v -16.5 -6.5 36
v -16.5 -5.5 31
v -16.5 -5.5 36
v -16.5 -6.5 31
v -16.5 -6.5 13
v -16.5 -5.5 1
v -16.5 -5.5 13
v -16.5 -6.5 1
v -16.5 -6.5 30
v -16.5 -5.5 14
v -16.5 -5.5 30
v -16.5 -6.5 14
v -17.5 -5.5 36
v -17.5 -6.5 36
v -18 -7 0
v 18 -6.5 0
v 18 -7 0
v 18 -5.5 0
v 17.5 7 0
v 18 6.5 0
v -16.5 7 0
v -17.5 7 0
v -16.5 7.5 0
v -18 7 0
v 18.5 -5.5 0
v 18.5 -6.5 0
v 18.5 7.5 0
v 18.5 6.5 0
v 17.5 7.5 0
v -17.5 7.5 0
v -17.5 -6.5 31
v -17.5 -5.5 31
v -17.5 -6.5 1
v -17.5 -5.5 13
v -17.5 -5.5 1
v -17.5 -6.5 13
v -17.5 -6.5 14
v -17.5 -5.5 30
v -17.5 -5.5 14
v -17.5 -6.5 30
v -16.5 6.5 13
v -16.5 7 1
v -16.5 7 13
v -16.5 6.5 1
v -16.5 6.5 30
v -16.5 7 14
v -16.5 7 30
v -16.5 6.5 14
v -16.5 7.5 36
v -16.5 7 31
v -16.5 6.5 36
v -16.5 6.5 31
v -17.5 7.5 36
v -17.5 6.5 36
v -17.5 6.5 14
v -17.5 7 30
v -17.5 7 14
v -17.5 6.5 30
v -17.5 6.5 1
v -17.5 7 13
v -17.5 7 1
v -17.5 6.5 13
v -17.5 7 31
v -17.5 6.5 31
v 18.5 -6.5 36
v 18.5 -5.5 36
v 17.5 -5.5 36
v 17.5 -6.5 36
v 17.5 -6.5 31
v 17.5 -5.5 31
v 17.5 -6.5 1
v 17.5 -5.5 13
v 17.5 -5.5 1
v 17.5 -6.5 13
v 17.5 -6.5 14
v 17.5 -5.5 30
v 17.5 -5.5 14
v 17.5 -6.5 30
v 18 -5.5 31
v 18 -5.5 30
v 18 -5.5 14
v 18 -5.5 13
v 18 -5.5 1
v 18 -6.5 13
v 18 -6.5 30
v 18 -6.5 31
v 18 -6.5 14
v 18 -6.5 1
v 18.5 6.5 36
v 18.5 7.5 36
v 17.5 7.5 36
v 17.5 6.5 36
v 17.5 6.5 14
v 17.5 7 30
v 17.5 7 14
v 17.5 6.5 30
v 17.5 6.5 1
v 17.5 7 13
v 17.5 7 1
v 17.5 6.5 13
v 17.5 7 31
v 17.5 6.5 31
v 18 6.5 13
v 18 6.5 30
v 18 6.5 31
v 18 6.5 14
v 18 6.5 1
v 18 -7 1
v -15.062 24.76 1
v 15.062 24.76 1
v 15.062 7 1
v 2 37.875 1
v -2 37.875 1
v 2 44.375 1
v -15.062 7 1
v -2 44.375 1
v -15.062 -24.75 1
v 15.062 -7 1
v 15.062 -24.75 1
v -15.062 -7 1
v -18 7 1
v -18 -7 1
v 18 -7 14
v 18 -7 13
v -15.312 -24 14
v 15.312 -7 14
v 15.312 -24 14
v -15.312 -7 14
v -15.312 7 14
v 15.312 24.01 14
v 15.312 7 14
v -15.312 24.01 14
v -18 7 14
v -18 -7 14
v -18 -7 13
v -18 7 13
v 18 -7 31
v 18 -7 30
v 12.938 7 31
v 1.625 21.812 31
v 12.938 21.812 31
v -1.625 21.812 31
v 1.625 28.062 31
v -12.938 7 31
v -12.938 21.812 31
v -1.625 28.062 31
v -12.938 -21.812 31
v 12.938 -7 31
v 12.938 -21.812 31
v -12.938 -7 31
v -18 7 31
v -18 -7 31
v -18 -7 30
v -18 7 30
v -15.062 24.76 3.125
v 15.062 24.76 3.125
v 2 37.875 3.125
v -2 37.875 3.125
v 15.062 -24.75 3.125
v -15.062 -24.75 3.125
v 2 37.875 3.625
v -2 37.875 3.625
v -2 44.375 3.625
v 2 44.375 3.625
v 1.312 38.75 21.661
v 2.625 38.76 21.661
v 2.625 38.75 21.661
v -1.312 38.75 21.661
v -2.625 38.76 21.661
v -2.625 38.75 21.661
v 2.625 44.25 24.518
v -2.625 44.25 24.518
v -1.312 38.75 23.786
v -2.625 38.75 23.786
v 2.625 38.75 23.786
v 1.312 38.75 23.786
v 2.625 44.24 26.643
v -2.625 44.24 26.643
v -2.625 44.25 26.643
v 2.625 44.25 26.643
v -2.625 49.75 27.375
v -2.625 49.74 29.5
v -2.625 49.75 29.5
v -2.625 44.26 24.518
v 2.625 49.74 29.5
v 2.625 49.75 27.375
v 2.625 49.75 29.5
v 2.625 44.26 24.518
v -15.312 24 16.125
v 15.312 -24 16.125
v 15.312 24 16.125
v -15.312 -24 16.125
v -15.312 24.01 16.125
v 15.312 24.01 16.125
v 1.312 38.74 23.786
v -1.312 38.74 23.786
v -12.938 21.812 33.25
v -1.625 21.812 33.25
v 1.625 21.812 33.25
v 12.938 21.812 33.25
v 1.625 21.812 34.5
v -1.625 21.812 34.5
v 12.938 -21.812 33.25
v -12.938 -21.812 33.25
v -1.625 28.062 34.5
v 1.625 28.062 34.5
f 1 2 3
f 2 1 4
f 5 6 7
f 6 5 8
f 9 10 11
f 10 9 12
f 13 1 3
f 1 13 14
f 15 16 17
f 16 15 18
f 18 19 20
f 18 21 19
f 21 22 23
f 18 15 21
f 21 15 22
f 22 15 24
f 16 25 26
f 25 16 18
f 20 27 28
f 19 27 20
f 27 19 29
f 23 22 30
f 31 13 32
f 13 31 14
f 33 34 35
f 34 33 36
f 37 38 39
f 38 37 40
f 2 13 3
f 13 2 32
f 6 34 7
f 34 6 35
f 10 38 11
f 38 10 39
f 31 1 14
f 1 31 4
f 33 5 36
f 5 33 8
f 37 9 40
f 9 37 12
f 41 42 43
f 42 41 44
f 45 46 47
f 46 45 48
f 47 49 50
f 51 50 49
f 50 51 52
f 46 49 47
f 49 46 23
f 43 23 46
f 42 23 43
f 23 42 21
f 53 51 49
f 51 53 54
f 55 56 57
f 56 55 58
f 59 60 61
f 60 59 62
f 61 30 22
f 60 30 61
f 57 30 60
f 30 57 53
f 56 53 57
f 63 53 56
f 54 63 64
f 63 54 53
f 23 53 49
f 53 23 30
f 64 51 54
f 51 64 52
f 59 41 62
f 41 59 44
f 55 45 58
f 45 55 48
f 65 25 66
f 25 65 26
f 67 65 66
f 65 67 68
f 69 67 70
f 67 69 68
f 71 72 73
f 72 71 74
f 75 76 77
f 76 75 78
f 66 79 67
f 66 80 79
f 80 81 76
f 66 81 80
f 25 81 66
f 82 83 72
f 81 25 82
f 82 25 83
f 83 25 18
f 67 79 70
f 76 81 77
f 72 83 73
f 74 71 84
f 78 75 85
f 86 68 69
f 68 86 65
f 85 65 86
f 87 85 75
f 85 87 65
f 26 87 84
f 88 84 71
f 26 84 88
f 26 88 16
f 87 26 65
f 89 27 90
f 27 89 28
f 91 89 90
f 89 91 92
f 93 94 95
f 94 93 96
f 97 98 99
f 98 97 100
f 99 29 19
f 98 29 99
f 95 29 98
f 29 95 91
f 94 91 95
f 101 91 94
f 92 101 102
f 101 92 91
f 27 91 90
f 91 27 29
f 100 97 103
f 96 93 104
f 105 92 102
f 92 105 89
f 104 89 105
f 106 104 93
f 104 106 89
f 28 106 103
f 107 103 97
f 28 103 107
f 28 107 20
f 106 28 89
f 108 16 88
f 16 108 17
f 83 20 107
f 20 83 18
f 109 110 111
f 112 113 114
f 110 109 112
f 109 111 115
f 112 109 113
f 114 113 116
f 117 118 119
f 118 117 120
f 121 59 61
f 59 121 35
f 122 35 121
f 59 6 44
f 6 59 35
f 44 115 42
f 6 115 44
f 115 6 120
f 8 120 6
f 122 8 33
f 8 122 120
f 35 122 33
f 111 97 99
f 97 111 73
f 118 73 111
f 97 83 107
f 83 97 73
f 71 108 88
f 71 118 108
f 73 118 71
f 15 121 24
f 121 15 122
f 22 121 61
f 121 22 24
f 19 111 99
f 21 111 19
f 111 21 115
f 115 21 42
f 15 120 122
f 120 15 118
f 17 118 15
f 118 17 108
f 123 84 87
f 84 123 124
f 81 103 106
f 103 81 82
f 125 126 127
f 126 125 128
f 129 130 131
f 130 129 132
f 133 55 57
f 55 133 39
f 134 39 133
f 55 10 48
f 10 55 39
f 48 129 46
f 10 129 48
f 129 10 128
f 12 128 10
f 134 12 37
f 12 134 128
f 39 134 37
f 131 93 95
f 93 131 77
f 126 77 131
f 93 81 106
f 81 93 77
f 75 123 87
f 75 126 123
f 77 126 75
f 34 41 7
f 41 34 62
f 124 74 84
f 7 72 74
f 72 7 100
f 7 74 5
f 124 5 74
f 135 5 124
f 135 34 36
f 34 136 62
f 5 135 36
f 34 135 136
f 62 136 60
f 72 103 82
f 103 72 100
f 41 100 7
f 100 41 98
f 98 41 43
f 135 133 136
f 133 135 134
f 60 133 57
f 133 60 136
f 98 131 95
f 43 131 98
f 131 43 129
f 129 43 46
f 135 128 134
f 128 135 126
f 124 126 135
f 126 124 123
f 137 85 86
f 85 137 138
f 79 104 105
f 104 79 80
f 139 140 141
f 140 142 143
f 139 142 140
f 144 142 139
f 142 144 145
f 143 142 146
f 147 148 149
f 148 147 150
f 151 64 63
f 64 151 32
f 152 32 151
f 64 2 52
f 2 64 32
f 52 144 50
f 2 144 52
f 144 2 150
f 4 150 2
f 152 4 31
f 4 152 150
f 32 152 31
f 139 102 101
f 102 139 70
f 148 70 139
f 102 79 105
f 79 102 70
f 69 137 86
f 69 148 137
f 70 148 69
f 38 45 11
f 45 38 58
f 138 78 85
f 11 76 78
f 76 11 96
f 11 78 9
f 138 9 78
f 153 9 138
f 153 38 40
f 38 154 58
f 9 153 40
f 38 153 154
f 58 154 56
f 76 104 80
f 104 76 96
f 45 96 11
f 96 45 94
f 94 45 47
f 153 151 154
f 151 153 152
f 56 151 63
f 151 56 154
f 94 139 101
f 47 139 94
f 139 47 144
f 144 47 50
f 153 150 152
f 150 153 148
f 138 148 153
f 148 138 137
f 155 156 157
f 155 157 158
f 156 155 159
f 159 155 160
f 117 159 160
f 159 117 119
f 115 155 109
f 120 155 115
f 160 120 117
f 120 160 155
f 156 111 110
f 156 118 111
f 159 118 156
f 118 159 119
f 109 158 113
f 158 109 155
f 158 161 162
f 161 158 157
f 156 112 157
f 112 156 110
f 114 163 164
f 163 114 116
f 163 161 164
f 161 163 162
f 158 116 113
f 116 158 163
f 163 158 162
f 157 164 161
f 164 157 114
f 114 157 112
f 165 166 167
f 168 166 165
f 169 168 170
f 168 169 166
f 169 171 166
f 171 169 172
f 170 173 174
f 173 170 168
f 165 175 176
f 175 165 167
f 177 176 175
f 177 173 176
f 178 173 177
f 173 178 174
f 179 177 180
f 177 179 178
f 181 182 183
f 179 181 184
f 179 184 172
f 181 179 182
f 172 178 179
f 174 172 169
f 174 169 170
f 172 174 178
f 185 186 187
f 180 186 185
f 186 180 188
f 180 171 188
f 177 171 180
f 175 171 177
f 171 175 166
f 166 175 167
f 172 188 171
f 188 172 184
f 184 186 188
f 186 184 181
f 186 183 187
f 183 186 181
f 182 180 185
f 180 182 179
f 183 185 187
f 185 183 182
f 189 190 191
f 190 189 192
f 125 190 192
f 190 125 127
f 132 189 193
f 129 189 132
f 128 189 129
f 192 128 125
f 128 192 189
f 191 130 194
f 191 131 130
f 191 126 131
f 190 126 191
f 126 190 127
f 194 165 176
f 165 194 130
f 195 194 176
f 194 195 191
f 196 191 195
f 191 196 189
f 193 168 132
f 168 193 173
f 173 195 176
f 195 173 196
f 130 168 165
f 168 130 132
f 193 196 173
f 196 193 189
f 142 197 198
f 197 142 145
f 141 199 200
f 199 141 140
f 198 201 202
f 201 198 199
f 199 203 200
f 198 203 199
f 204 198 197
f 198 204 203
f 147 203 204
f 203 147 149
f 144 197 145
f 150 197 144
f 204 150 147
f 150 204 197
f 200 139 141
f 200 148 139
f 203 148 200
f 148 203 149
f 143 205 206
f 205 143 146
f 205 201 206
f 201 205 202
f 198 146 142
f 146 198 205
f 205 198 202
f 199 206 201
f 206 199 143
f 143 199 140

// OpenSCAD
// =============================================================
// MUON DETECTOR SETUP - beginner-friendly OpenSCAD version
// =============================================================
//
// IMPORTANT IDEA:
// OpenSCAD does NOT force any real-world unit system.
// It just uses numbers.
//
// So in this file, we will treat:
//     1 OpenSCAD unit = 1 inch
//
// That means all of your measurements can stay exactly as written.
// No inch() conversion function is needed.
//
// Example:
//     cube([10, 2, 1]);
// means a box that is 10 in long, 2 in wide, 1 in tall.
//
// -------------------------------------------------------------
// COORDINATE SYSTEM USED IN THIS MODEL
// -------------------------------------------------------------
// x = length direction (left/right in the side view)
// y = width direction  (into/out of the screen in the side view)
// z = vertical direction (up/down)
//
// Every slab is centered in x and y, and starts at z = 0.
// So a slab with height 2.125 goes from z = 0 up to z = 2.125.
//
// -------------------------------------------------------------
// WHAT THIS FILE CONTAINS
// -------------------------------------------------------------
// 1. A simple 3-shelf rack
// 2. Top detector: slab + PMT
// 3. Bottom detector: slab + flush light tunnel + PMT
// 4. Middle detector: slab + diagonal light tunnel + diagonal PMTs
//
// The middle detector PMTs are still a best-effort 2x2 arrangement,
// because exact side-to-side PMT positions were not provided.
// =============================================================


// -------------------------------------------------------------
// SMALL HELPER VALUE
// -------------------------------------------------------------
// EPS is a tiny length used when making hull()-based shapes.
// If we used a face with exactly zero thickness, OpenSCAD would not
// have a real 3D object to hull together.
// So we use a very tiny thickness instead.
EPS = 0.01;


// -------------------------------------------------------------
// DISPLAY TOGGLES
// -------------------------------------------------------------
// Turn these true/false depending on what you want to see.
SHOW_SHELF = true;
EXPLODED_VIEW = false;   // true = separate the detectors for inspection
SHOW_AXES = false;       // true = show x/y/z guide axes
ROTATE_DETECTORS_90 = true;


// -------------------------------------------------------------
// SHELF DIMENSIONS
// -------------------------------------------------------------
// All numbers below are treated directly as inches.
SHELF_W = 36;
SHELF_D = 14;
SHELF_H = 36;
SHELF_THICK = 1;
POST_SIZE = 1;

// Shelf z-heights.
// These are the heights of the shelf BOARDS themselves.
// The actual detectors sit on top of those boards.
SHELF_ZS = [0, 13, 30];


// -------------------------------------------------------------
// TOP DETECTOR DIMENSIONS
// -------------------------------------------------------------
TOP_SLAB_L = 43.625;
TOP_SLAB_W = 25.875;
TOP_SLAB_H = 2.25;

TOP_PMT_L = 6.25;
TOP_PMT_W = 3.25;
TOP_PMT_H = 3.5;


// -------------------------------------------------------------
// BOTTOM DETECTOR DIMENSIONS
// -------------------------------------------------------------
BOT_SLAB_L = 49.5;
BOT_SLAB_W = 30.125;
BOT_SLAB_H = 2.125;

BOT_GUIDE_L = 13.125;
BOT_GUIDE_W1 = 30.125;
BOT_GUIDE_W2 = 4.0;
BOT_GUIDE_H = 2.125;
BOT_GUIDE_RISE = 0.0;   // guide stays flush with slab, so no upward rise

BOT_PMT_L = 6.5;
BOT_PMT_W = 4.0;
BOT_PMT_H = 2.625;


// -------------------------------------------------------------
// MIDDLE DETECTOR DIMENSIONS
// -------------------------------------------------------------
MID_SLAB_L = 48.0;
MID_SLAB_W = 30.625;
MID_SLAB_H = 2.125;

MID_GUIDE_L = 14.75;
MID_GUIDE_W1 = 30.625;
MID_GUIDE_W2 = 2.625;
MID_GUIDE_H = 2.125;

MID_PMT_L = 5.5;
MID_PMT_W = 2.625;
MID_PMT_H = 2.125;
MID_PMT_GAP_Y = 0.0;

// You asked for the middle add-on assembly to reach a total height of 15.5 in.
// Here that means:
//   from z = 0 at the bottom of the slab/guide
//   up to the highest point of the outermost PMT
MID_TOTAL_HEIGHT = 15.5;

// The guide and PMTs all follow the same slope.
// The sloped run goes across:
//   guide length + first PMT length + second PMT length
MID_TOTAL_RUN = MID_GUIDE_L + 2 * MID_PMT_L;

// Since the PMT thickness itself is 2.125, the bottom surface must rise by:
//   total desired top height - PMT thickness
MID_TOTAL_RISE = MID_TOTAL_HEIGHT - MID_PMT_H;

// Rise per inch of horizontal run
MID_SLOPE_PER_IN = MID_TOTAL_RISE / MID_TOTAL_RUN;

// Rise from the start of the guide to the end of the guide
MID_GUIDE_RISE = MID_GUIDE_L * MID_SLOPE_PER_IN;

// Rise across one PMT length
MID_PMT_RISE = MID_PMT_L * MID_SLOPE_PER_IN;


// =============================================================
// BASIC BUILDING BLOCK MODULES
// =============================================================

// -------------------------------------------------------------
// centered_box_xy(l, w, h)
// -------------------------------------------------------------
// Makes a rectangular box centered in x and y.
// z starts at 0.
//
// So:
//   x goes from -l/2 to +l/2
//   y goes from -w/2 to +w/2
//   z goes from 0 to h
module centered_box_xy(l, w, h) {
    translate([-l/2, -w/2, 0])
        cube([l, w, h]);
}


// A slab is just a centered box.
module slab_body(l, w, h) {
    centered_box_xy(l, w, h);
}


// -------------------------------------------------------------
// pmt_block(l, w, h, x_start, z_start, y_center)
// -------------------------------------------------------------
// Makes a simple rectangular PMT block.
//
// x_start = where the PMT begins in x
// z_start = where the PMT bottom begins in z
// y_center = centerline of the PMT in y
module pmt_block(l, w, h, x_start, z_start, y_center = 0) {
    translate([x_start, y_center - w/2, z_start])
        cube([l, w, h]);
}


// -------------------------------------------------------------
// side_attached_constant_thickness_guide(...)
// -------------------------------------------------------------
// This makes the light tunnel / trapezoid.
//
// It uses hull() between two thin rectangular end faces:
// - the first face is the wide face attached to the slab
// - the second face is the narrow face at the outer end
//
// If rise = 0, the guide is flat and flush.
// If rise > 0, the guide slopes upward as it goes outward.
module side_attached_constant_thickness_guide(
    l,
    w1,
    w2,
    thickness,
    rise,
    x_attach,
    z_base_start = 0
) {
    hull() {
        // Wide face where the guide touches the slab
        translate([x_attach, -w1/2, z_base_start])
            cube([EPS, w1, thickness]);

        // Narrow outer face, shifted upward by "rise"
        translate([x_attach + l - EPS, -w2/2, z_base_start + rise])
            cube([EPS, w2, thickness]);
    }
}


// -------------------------------------------------------------
// oblique_pmt_same_as_guide(...)
// -------------------------------------------------------------
// This makes a PMT the same way the guide is made.
//
// Why do it this way?
// Because simply rotating a rectangular PMT looked wrong in the side view.
// Building it with hull() keeps it visually aligned with the guide.
module oblique_pmt_same_as_guide(
    l,
    w,
    h,
    rise,
    x_start,
    z_start,
    y_center = 0
) {
    hull() {
        // Starting PMT face
        translate([x_start, y_center - w/2, z_start])
            cube([EPS, w, h]);

        // Ending PMT face, moved upward by "rise"
        translate([x_start + l - EPS, y_center - w/2, z_start + rise])
            cube([EPS, w, h]);
    }
}


// -------------------------------------------------------------
// axes(len)
// -------------------------------------------------------------
// Optional helper axes to understand orientation.
module axes(len = 8) {
    color("red")   cube([len, 0.15, 0.15]);
    color("green") cube([0.15, len, 0.15]);
    color("blue")  cube([0.15, 0.15, len]);
}


// =============================================================
// SHELF MODULE
// =============================================================

module shelf_unit() {
    color("silver") {

        // Four vertical corner posts
        for (xsign = [-1, 1], ysign = [-1, 1]) {
            translate([
                xsign * (SHELF_W/2 - POST_SIZE/2),
                ysign * (SHELF_D/2 - POST_SIZE/2),
                0
            ])
                cube([POST_SIZE, POST_SIZE, SHELF_H]);
        }

        // Three shelf boards
        for (z0 = SHELF_ZS) {
            translate([-SHELF_W/2, -SHELF_D/2, z0])
                cube([SHELF_W, SHELF_D, SHELF_THICK]);
        }
    }
}


// =============================================================
// ORIENTATION HELPER
// =============================================================

// This rotates each detector assembly by 90 degrees in the x-y plane.
// If you set ROTATE_DETECTORS_90 = false, the detectors go back to their
// unrotated orientation.
module maybe_rotate_detector() {
    if (ROTATE_DETECTORS_90)
        rotate([0, 0, 90]) children();
    else
        children();
}


// =============================================================
// DETECTOR ASSEMBLIES
// =============================================================

// -------------------------------------------------------------
// TOP DETECTOR
// -------------------------------------------------------------
module top_slab_assembly() {
    maybe_rotate_detector() {

        // Top slab
        color([0.2, 0.55, 0.95, 0.65])
            slab_body(TOP_SLAB_L, TOP_SLAB_W, TOP_SLAB_H);

        // Top PMT
        // Starts at the slab edge in +x direction.
        // Bottom of PMT is flush with bottom of slab (z = 0).
        color([0.22, 0.22, 0.22, 0.95])
            pmt_block(
                TOP_PMT_L,
                TOP_PMT_W,
                TOP_PMT_H,
                TOP_SLAB_L / 2,
                0,
                0
            );
    }
}


// -------------------------------------------------------------
// BOTTOM DETECTOR
// -------------------------------------------------------------
module bottom_slab_assembly() {
    maybe_rotate_detector() {

        // Bottom slab
        color([0.15, 0.70, 0.80, 0.65])
            slab_body(BOT_SLAB_L, BOT_SLAB_W, BOT_SLAB_H);

        // Bottom guide / light tunnel
        // This is attached at the slab edge and stays flush with the slab.
        color([0.70, 0.70, 0.75, 0.90])
            side_attached_constant_thickness_guide(
                BOT_GUIDE_L,
                BOT_GUIDE_W1,
                BOT_GUIDE_W2,
                BOT_GUIDE_H,
                BOT_GUIDE_RISE,
                BOT_SLAB_L / 2,
                0
            );

        // Bottom PMT
        // Starts at the outer end of the guide.
        // PMT bottom is flush with guide bottom.
        color([0.22, 0.22, 0.22, 0.95])
            pmt_block(
                BOT_PMT_L,
                BOT_PMT_W,
                BOT_PMT_H,
                BOT_SLAB_L / 2 + BOT_GUIDE_L,
                0,
                0
            );
    }
}


// -------------------------------------------------------------
// MIDDLE DETECTOR
// -------------------------------------------------------------
module middle_slab_assembly() {
    maybe_rotate_detector() {

        // Middle slab
        color([0.25, 0.82, 0.55, 0.65])
            slab_body(MID_SLAB_L, MID_SLAB_W, MID_SLAB_H);

        // Middle guide / light tunnel
        // This one slopes upward and has constant thickness.
        color([0.78, 0.78, 0.83, 0.90])
            side_attached_constant_thickness_guide(
                MID_GUIDE_L,
                MID_GUIDE_W1,
                MID_GUIDE_W2,
                MID_GUIDE_H,
                MID_GUIDE_RISE,
                MID_SLAB_L / 2,
                0
            );

        // Where the guide ends in x and z.
        // The PMTs begin exactly there.
        x_front = MID_SLAB_L / 2 + MID_GUIDE_L;
        z_front = MID_GUIDE_RISE;

        // Two PMTs in +y / -y for the first row
        y_top =  MID_PMT_W / 2 + MID_PMT_GAP_Y / 2;
        y_bot = -MID_PMT_W / 2 - MID_PMT_GAP_Y / 2;

        // Middle PMTs
        // Built the same way as the guide so they point the same direction.
        // Current layout = 2x2 cluster, best estimate.
        color([0.18, 0.18, 0.18, 0.95]) {

            // First pair of PMTs, starting directly at the guide exit
            oblique_pmt_same_as_guide(
                MID_PMT_L, MID_PMT_W, MID_PMT_H,
                MID_PMT_RISE,
                x_front, z_front, y_top
            );

            oblique_pmt_same_as_guide(
                MID_PMT_L, MID_PMT_W, MID_PMT_H,
                MID_PMT_RISE,
                x_front, z_front, y_bot
            );

            // Second pair of PMTs, continuing the same slope farther outward
            oblique_pmt_same_as_guide(
                MID_PMT_L, MID_PMT_W, MID_PMT_H,
                MID_PMT_RISE,
                x_front + MID_PMT_L,
                z_front + MID_PMT_RISE,
                y_top
            );

            oblique_pmt_same_as_guide(
                MID_PMT_L, MID_PMT_W, MID_PMT_H,
                MID_PMT_RISE,
                x_front + MID_PMT_L,
                z_front + MID_PMT_RISE,
                y_bot
            );
        }
    }
}


// =============================================================
// WHOLE-SCENE LAYOUT
// =============================================================

// Exploded view: detectors spread apart so you can inspect them individually.
module exploded_layout() {
    dx = 85;

    translate([-dx, 0, 0]) bottom_slab_assembly();
    middle_slab_assembly();
    translate([ dx, 0, 0]) top_slab_assembly();
}


// Shelf view: detectors placed on the 3 shelves.
module shelf_layout() {

    if (SHOW_SHELF)
        shelf_unit();

    // Put each detector on top of its shelf board.
    translate([0, 0, SHELF_ZS[0] + SHELF_THICK]) bottom_slab_assembly();
    translate([0, 0, SHELF_ZS[1] + SHELF_THICK]) middle_slab_assembly();
    translate([0, 0, SHELF_ZS[2] + SHELF_THICK]) top_slab_assembly();
}


// =============================================================
// FINAL DRAW CALLS
// =============================================================

if (SHOW_AXES)
    axes();

if (EXPLODED_VIEW)
    exploded_layout();
else
    shelf_layout();
